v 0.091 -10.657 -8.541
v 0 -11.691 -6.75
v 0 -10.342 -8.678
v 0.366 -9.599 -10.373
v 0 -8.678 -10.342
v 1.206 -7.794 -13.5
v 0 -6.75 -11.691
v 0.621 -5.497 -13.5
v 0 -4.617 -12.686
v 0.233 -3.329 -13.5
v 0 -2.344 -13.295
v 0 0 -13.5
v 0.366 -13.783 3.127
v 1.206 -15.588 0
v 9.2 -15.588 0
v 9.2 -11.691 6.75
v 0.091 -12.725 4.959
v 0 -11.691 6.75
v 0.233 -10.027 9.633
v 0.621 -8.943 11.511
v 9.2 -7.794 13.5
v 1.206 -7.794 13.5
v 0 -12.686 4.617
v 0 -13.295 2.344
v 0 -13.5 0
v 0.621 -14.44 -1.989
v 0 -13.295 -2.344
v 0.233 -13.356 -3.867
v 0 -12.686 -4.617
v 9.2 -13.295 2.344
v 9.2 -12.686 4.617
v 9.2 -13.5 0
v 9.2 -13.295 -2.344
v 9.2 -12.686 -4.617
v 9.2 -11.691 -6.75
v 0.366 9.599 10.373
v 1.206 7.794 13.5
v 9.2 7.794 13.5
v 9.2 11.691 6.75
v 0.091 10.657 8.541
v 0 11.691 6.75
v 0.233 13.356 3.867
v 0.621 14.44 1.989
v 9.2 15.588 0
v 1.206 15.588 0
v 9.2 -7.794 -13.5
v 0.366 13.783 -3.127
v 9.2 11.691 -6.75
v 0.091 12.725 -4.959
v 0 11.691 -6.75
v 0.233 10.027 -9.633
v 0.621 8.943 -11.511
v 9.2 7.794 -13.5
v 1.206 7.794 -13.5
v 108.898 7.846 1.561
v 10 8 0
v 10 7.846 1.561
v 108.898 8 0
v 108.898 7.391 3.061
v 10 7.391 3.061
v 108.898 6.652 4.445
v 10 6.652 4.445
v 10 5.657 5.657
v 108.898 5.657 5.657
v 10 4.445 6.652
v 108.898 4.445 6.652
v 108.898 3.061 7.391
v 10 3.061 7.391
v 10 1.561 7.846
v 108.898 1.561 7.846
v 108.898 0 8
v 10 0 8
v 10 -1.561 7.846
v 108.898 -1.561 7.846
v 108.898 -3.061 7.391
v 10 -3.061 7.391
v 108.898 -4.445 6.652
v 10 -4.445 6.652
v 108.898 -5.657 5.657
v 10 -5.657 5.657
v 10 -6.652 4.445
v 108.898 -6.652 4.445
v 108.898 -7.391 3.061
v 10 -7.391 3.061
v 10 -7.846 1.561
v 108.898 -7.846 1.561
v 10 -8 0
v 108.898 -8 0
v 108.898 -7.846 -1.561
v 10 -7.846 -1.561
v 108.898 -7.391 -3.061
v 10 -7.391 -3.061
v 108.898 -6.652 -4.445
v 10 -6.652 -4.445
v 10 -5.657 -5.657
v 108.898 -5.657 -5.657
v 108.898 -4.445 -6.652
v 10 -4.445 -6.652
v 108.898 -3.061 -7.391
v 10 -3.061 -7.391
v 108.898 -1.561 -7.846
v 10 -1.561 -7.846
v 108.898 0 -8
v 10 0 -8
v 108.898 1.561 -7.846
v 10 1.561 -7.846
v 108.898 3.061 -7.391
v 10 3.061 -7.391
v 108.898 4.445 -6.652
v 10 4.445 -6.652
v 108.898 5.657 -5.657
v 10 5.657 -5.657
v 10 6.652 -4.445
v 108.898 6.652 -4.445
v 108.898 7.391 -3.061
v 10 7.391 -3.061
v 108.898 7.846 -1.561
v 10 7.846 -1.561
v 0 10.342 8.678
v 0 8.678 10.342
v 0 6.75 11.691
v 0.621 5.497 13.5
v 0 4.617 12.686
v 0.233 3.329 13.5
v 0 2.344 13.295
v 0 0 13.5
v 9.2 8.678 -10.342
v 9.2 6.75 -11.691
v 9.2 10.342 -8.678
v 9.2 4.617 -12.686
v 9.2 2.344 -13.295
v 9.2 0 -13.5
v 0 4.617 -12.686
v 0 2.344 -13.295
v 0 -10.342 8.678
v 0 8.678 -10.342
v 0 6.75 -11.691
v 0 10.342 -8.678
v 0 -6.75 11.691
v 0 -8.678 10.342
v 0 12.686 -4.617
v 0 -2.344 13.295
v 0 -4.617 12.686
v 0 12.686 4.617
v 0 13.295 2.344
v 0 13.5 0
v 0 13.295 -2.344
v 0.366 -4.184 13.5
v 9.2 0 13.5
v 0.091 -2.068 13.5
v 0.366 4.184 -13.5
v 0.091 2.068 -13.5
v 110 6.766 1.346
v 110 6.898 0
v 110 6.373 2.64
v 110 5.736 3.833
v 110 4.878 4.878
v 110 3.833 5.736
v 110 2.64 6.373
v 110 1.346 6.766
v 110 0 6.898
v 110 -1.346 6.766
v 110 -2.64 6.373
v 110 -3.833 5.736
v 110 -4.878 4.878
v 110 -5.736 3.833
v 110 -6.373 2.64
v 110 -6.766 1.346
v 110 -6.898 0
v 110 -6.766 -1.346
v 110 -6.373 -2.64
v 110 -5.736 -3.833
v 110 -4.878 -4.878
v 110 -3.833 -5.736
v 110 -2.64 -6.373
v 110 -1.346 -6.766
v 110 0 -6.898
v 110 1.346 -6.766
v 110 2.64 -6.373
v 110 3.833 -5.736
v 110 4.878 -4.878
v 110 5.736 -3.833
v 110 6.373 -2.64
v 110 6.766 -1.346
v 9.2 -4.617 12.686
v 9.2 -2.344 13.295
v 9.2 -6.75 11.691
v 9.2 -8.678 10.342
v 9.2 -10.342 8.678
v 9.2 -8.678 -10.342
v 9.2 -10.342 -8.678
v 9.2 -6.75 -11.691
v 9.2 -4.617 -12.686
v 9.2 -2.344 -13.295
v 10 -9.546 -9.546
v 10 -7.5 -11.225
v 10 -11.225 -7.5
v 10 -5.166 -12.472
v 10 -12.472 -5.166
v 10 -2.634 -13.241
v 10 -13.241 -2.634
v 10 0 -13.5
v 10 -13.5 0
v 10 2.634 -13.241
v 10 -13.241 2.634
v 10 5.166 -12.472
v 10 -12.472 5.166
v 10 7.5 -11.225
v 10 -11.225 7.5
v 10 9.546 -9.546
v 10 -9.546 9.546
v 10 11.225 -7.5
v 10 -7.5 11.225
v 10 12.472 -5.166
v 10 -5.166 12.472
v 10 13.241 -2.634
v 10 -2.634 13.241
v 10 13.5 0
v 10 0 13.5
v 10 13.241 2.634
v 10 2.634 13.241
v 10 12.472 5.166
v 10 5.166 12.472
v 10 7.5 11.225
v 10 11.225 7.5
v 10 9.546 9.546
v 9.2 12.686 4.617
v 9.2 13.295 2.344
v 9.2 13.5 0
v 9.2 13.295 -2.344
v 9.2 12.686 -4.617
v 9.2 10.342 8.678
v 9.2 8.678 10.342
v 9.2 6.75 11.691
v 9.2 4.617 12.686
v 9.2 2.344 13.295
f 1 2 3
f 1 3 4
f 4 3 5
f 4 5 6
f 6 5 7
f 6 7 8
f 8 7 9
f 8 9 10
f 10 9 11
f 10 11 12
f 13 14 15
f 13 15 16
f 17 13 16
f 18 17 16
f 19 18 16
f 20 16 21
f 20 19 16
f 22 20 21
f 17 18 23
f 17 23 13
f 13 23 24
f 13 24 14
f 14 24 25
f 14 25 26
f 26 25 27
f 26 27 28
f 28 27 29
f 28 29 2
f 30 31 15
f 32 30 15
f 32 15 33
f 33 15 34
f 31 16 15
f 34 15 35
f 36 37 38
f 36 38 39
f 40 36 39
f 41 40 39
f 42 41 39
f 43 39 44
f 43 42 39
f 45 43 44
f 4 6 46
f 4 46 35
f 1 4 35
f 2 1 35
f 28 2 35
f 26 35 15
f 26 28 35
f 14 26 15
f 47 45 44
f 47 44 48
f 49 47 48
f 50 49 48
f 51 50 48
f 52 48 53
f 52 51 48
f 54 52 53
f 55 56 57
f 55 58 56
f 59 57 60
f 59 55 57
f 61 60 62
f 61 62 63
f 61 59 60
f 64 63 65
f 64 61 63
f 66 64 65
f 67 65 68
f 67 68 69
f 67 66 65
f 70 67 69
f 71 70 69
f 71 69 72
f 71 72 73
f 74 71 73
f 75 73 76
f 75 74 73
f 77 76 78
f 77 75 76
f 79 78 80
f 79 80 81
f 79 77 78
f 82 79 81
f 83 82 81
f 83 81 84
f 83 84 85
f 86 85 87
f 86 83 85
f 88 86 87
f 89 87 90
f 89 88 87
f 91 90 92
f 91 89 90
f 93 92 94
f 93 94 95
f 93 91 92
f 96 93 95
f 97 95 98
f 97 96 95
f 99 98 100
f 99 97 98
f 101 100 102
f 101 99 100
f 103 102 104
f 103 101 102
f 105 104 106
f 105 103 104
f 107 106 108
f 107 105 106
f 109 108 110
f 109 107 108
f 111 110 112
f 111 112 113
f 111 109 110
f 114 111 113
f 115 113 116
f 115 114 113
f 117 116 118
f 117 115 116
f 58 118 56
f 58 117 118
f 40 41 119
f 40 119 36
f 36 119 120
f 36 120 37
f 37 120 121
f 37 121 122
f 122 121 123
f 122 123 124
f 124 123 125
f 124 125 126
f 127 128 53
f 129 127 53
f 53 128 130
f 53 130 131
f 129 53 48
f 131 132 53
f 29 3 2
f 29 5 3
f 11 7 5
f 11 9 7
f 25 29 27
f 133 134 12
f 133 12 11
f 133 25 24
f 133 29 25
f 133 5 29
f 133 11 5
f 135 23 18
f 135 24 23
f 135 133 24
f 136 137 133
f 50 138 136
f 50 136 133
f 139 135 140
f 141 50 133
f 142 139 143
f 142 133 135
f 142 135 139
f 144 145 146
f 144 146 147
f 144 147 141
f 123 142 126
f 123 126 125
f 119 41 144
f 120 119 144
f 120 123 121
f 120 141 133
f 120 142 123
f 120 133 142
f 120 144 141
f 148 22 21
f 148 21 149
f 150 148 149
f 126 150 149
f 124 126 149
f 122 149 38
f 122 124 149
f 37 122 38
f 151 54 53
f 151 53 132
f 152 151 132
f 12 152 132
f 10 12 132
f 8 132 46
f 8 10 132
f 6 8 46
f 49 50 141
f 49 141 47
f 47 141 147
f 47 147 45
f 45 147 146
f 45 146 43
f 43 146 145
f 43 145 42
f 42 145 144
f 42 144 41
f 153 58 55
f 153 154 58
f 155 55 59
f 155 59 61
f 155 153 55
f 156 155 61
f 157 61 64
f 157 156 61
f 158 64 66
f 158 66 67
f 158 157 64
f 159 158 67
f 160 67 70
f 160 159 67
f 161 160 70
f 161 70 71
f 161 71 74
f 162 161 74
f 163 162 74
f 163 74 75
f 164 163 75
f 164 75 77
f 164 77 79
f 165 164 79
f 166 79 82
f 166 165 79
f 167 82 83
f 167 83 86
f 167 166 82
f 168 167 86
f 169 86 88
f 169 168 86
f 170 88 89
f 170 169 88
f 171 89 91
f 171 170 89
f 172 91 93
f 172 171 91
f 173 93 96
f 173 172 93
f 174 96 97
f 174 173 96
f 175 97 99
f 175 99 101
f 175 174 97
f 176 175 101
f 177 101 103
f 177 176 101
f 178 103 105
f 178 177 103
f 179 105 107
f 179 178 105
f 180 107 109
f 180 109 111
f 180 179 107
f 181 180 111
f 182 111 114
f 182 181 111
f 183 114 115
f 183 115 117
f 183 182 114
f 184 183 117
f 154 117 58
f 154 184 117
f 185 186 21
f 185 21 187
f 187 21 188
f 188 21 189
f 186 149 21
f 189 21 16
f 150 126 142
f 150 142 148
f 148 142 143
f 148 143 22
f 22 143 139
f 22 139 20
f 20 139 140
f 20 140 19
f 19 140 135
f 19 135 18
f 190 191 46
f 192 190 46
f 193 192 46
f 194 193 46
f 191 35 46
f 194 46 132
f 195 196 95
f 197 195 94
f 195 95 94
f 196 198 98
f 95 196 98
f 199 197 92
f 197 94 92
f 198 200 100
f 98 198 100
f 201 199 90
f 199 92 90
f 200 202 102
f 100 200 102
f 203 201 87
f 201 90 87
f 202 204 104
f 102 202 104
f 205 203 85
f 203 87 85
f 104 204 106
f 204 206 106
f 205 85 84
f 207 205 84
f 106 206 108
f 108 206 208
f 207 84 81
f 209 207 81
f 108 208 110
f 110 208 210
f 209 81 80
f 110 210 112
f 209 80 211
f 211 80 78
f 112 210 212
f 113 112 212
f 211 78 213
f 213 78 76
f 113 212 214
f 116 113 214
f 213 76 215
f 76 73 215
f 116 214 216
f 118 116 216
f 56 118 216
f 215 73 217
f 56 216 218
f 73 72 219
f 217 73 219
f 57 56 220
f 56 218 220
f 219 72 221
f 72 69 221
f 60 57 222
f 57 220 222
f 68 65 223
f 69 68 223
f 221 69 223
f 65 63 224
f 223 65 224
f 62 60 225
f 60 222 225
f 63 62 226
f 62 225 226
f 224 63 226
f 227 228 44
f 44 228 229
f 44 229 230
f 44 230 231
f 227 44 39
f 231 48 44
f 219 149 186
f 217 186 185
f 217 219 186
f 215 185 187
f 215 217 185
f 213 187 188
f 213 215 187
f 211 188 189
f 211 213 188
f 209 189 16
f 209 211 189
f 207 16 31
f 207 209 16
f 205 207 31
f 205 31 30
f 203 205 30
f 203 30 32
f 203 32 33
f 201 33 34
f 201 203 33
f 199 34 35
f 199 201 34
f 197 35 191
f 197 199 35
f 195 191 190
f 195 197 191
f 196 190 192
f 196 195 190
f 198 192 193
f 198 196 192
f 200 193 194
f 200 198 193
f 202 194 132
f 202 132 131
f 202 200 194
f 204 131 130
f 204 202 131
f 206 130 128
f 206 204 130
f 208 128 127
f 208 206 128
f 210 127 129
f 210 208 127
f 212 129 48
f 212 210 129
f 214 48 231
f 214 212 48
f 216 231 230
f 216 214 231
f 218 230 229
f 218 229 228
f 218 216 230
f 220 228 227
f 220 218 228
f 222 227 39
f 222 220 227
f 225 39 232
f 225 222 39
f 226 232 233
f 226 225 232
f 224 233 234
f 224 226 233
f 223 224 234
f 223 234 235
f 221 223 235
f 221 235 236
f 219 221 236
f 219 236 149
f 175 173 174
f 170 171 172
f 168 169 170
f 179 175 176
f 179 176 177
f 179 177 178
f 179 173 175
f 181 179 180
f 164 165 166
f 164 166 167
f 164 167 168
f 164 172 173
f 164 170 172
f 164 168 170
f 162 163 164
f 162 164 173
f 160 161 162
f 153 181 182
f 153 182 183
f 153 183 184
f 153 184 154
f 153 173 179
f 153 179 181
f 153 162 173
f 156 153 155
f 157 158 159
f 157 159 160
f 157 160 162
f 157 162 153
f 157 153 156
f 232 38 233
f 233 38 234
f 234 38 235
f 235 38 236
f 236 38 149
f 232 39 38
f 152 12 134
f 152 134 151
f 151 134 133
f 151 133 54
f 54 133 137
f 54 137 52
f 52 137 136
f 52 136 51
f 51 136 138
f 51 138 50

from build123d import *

# Parameters (mm, degrees)
BASEHEAD_DEPTH = 10
SKETCH4_W      = 0.8
SKETCH4_H      = 12.088457268


# Read off the part's stored shape, not the designer's step: HeadChamfer
with BuildPart() as part:
    # Sketch1 → BaseHead (new body)
    with BuildSketch(Plane(origin=(0, 0, 0), x_dir=(0, 0, -1), z_dir=(1, 0, 0))):
        Polygon((13.5, 7.794228634), (13.5, -7.794228634), (0, -15.588457268), (-13.5, -7.794228634), (-13.5, 7.794228634), (0, 15.588457268), align=None)
    extrude(amount=BASEHEAD_DEPTH)

    # HeadChamfer outline → HeadChamfer (revolve, cut)
    with BuildSketch(Plane.YX):
        Polygon((15.58845727, 1.205771367), (13.499999851, -8.6e-08), (15.58845727, -8.6e-08), align=None)
    revolve(axis=Axis((0, 0, 0), (1, 0, 0)), mode=Mode.SUBTRACT)

    # HeadChamfer 2 outline → HeadChamfer 2 (revolve)
    with BuildSketch(Plane.YX):
        Polygon((8, 10), (8, 108.8985), (6.8985, 110), (0, 110), (0, 10), align=None)
    revolve(axis=Axis((0, 0, 0), (1, 0, 0)))

    # Sketch4 → BearingFace (revolve, cut)
    with BuildSketch(Plane.XY, mode=Mode.PRIVATE) as bearingface_sk:
        with Locations((9.6, 19.544228634)):
            Rectangle(SKETCH4_W, SKETCH4_H)
    revolve(bearingface_sk.sketch.rotate(Axis((0, 0, 0), (1, 0, 0)), 90), axis=Axis((0, 0, 0), (1, 0, 0)), mode=Mode.SUBTRACT)


solid = part.part
